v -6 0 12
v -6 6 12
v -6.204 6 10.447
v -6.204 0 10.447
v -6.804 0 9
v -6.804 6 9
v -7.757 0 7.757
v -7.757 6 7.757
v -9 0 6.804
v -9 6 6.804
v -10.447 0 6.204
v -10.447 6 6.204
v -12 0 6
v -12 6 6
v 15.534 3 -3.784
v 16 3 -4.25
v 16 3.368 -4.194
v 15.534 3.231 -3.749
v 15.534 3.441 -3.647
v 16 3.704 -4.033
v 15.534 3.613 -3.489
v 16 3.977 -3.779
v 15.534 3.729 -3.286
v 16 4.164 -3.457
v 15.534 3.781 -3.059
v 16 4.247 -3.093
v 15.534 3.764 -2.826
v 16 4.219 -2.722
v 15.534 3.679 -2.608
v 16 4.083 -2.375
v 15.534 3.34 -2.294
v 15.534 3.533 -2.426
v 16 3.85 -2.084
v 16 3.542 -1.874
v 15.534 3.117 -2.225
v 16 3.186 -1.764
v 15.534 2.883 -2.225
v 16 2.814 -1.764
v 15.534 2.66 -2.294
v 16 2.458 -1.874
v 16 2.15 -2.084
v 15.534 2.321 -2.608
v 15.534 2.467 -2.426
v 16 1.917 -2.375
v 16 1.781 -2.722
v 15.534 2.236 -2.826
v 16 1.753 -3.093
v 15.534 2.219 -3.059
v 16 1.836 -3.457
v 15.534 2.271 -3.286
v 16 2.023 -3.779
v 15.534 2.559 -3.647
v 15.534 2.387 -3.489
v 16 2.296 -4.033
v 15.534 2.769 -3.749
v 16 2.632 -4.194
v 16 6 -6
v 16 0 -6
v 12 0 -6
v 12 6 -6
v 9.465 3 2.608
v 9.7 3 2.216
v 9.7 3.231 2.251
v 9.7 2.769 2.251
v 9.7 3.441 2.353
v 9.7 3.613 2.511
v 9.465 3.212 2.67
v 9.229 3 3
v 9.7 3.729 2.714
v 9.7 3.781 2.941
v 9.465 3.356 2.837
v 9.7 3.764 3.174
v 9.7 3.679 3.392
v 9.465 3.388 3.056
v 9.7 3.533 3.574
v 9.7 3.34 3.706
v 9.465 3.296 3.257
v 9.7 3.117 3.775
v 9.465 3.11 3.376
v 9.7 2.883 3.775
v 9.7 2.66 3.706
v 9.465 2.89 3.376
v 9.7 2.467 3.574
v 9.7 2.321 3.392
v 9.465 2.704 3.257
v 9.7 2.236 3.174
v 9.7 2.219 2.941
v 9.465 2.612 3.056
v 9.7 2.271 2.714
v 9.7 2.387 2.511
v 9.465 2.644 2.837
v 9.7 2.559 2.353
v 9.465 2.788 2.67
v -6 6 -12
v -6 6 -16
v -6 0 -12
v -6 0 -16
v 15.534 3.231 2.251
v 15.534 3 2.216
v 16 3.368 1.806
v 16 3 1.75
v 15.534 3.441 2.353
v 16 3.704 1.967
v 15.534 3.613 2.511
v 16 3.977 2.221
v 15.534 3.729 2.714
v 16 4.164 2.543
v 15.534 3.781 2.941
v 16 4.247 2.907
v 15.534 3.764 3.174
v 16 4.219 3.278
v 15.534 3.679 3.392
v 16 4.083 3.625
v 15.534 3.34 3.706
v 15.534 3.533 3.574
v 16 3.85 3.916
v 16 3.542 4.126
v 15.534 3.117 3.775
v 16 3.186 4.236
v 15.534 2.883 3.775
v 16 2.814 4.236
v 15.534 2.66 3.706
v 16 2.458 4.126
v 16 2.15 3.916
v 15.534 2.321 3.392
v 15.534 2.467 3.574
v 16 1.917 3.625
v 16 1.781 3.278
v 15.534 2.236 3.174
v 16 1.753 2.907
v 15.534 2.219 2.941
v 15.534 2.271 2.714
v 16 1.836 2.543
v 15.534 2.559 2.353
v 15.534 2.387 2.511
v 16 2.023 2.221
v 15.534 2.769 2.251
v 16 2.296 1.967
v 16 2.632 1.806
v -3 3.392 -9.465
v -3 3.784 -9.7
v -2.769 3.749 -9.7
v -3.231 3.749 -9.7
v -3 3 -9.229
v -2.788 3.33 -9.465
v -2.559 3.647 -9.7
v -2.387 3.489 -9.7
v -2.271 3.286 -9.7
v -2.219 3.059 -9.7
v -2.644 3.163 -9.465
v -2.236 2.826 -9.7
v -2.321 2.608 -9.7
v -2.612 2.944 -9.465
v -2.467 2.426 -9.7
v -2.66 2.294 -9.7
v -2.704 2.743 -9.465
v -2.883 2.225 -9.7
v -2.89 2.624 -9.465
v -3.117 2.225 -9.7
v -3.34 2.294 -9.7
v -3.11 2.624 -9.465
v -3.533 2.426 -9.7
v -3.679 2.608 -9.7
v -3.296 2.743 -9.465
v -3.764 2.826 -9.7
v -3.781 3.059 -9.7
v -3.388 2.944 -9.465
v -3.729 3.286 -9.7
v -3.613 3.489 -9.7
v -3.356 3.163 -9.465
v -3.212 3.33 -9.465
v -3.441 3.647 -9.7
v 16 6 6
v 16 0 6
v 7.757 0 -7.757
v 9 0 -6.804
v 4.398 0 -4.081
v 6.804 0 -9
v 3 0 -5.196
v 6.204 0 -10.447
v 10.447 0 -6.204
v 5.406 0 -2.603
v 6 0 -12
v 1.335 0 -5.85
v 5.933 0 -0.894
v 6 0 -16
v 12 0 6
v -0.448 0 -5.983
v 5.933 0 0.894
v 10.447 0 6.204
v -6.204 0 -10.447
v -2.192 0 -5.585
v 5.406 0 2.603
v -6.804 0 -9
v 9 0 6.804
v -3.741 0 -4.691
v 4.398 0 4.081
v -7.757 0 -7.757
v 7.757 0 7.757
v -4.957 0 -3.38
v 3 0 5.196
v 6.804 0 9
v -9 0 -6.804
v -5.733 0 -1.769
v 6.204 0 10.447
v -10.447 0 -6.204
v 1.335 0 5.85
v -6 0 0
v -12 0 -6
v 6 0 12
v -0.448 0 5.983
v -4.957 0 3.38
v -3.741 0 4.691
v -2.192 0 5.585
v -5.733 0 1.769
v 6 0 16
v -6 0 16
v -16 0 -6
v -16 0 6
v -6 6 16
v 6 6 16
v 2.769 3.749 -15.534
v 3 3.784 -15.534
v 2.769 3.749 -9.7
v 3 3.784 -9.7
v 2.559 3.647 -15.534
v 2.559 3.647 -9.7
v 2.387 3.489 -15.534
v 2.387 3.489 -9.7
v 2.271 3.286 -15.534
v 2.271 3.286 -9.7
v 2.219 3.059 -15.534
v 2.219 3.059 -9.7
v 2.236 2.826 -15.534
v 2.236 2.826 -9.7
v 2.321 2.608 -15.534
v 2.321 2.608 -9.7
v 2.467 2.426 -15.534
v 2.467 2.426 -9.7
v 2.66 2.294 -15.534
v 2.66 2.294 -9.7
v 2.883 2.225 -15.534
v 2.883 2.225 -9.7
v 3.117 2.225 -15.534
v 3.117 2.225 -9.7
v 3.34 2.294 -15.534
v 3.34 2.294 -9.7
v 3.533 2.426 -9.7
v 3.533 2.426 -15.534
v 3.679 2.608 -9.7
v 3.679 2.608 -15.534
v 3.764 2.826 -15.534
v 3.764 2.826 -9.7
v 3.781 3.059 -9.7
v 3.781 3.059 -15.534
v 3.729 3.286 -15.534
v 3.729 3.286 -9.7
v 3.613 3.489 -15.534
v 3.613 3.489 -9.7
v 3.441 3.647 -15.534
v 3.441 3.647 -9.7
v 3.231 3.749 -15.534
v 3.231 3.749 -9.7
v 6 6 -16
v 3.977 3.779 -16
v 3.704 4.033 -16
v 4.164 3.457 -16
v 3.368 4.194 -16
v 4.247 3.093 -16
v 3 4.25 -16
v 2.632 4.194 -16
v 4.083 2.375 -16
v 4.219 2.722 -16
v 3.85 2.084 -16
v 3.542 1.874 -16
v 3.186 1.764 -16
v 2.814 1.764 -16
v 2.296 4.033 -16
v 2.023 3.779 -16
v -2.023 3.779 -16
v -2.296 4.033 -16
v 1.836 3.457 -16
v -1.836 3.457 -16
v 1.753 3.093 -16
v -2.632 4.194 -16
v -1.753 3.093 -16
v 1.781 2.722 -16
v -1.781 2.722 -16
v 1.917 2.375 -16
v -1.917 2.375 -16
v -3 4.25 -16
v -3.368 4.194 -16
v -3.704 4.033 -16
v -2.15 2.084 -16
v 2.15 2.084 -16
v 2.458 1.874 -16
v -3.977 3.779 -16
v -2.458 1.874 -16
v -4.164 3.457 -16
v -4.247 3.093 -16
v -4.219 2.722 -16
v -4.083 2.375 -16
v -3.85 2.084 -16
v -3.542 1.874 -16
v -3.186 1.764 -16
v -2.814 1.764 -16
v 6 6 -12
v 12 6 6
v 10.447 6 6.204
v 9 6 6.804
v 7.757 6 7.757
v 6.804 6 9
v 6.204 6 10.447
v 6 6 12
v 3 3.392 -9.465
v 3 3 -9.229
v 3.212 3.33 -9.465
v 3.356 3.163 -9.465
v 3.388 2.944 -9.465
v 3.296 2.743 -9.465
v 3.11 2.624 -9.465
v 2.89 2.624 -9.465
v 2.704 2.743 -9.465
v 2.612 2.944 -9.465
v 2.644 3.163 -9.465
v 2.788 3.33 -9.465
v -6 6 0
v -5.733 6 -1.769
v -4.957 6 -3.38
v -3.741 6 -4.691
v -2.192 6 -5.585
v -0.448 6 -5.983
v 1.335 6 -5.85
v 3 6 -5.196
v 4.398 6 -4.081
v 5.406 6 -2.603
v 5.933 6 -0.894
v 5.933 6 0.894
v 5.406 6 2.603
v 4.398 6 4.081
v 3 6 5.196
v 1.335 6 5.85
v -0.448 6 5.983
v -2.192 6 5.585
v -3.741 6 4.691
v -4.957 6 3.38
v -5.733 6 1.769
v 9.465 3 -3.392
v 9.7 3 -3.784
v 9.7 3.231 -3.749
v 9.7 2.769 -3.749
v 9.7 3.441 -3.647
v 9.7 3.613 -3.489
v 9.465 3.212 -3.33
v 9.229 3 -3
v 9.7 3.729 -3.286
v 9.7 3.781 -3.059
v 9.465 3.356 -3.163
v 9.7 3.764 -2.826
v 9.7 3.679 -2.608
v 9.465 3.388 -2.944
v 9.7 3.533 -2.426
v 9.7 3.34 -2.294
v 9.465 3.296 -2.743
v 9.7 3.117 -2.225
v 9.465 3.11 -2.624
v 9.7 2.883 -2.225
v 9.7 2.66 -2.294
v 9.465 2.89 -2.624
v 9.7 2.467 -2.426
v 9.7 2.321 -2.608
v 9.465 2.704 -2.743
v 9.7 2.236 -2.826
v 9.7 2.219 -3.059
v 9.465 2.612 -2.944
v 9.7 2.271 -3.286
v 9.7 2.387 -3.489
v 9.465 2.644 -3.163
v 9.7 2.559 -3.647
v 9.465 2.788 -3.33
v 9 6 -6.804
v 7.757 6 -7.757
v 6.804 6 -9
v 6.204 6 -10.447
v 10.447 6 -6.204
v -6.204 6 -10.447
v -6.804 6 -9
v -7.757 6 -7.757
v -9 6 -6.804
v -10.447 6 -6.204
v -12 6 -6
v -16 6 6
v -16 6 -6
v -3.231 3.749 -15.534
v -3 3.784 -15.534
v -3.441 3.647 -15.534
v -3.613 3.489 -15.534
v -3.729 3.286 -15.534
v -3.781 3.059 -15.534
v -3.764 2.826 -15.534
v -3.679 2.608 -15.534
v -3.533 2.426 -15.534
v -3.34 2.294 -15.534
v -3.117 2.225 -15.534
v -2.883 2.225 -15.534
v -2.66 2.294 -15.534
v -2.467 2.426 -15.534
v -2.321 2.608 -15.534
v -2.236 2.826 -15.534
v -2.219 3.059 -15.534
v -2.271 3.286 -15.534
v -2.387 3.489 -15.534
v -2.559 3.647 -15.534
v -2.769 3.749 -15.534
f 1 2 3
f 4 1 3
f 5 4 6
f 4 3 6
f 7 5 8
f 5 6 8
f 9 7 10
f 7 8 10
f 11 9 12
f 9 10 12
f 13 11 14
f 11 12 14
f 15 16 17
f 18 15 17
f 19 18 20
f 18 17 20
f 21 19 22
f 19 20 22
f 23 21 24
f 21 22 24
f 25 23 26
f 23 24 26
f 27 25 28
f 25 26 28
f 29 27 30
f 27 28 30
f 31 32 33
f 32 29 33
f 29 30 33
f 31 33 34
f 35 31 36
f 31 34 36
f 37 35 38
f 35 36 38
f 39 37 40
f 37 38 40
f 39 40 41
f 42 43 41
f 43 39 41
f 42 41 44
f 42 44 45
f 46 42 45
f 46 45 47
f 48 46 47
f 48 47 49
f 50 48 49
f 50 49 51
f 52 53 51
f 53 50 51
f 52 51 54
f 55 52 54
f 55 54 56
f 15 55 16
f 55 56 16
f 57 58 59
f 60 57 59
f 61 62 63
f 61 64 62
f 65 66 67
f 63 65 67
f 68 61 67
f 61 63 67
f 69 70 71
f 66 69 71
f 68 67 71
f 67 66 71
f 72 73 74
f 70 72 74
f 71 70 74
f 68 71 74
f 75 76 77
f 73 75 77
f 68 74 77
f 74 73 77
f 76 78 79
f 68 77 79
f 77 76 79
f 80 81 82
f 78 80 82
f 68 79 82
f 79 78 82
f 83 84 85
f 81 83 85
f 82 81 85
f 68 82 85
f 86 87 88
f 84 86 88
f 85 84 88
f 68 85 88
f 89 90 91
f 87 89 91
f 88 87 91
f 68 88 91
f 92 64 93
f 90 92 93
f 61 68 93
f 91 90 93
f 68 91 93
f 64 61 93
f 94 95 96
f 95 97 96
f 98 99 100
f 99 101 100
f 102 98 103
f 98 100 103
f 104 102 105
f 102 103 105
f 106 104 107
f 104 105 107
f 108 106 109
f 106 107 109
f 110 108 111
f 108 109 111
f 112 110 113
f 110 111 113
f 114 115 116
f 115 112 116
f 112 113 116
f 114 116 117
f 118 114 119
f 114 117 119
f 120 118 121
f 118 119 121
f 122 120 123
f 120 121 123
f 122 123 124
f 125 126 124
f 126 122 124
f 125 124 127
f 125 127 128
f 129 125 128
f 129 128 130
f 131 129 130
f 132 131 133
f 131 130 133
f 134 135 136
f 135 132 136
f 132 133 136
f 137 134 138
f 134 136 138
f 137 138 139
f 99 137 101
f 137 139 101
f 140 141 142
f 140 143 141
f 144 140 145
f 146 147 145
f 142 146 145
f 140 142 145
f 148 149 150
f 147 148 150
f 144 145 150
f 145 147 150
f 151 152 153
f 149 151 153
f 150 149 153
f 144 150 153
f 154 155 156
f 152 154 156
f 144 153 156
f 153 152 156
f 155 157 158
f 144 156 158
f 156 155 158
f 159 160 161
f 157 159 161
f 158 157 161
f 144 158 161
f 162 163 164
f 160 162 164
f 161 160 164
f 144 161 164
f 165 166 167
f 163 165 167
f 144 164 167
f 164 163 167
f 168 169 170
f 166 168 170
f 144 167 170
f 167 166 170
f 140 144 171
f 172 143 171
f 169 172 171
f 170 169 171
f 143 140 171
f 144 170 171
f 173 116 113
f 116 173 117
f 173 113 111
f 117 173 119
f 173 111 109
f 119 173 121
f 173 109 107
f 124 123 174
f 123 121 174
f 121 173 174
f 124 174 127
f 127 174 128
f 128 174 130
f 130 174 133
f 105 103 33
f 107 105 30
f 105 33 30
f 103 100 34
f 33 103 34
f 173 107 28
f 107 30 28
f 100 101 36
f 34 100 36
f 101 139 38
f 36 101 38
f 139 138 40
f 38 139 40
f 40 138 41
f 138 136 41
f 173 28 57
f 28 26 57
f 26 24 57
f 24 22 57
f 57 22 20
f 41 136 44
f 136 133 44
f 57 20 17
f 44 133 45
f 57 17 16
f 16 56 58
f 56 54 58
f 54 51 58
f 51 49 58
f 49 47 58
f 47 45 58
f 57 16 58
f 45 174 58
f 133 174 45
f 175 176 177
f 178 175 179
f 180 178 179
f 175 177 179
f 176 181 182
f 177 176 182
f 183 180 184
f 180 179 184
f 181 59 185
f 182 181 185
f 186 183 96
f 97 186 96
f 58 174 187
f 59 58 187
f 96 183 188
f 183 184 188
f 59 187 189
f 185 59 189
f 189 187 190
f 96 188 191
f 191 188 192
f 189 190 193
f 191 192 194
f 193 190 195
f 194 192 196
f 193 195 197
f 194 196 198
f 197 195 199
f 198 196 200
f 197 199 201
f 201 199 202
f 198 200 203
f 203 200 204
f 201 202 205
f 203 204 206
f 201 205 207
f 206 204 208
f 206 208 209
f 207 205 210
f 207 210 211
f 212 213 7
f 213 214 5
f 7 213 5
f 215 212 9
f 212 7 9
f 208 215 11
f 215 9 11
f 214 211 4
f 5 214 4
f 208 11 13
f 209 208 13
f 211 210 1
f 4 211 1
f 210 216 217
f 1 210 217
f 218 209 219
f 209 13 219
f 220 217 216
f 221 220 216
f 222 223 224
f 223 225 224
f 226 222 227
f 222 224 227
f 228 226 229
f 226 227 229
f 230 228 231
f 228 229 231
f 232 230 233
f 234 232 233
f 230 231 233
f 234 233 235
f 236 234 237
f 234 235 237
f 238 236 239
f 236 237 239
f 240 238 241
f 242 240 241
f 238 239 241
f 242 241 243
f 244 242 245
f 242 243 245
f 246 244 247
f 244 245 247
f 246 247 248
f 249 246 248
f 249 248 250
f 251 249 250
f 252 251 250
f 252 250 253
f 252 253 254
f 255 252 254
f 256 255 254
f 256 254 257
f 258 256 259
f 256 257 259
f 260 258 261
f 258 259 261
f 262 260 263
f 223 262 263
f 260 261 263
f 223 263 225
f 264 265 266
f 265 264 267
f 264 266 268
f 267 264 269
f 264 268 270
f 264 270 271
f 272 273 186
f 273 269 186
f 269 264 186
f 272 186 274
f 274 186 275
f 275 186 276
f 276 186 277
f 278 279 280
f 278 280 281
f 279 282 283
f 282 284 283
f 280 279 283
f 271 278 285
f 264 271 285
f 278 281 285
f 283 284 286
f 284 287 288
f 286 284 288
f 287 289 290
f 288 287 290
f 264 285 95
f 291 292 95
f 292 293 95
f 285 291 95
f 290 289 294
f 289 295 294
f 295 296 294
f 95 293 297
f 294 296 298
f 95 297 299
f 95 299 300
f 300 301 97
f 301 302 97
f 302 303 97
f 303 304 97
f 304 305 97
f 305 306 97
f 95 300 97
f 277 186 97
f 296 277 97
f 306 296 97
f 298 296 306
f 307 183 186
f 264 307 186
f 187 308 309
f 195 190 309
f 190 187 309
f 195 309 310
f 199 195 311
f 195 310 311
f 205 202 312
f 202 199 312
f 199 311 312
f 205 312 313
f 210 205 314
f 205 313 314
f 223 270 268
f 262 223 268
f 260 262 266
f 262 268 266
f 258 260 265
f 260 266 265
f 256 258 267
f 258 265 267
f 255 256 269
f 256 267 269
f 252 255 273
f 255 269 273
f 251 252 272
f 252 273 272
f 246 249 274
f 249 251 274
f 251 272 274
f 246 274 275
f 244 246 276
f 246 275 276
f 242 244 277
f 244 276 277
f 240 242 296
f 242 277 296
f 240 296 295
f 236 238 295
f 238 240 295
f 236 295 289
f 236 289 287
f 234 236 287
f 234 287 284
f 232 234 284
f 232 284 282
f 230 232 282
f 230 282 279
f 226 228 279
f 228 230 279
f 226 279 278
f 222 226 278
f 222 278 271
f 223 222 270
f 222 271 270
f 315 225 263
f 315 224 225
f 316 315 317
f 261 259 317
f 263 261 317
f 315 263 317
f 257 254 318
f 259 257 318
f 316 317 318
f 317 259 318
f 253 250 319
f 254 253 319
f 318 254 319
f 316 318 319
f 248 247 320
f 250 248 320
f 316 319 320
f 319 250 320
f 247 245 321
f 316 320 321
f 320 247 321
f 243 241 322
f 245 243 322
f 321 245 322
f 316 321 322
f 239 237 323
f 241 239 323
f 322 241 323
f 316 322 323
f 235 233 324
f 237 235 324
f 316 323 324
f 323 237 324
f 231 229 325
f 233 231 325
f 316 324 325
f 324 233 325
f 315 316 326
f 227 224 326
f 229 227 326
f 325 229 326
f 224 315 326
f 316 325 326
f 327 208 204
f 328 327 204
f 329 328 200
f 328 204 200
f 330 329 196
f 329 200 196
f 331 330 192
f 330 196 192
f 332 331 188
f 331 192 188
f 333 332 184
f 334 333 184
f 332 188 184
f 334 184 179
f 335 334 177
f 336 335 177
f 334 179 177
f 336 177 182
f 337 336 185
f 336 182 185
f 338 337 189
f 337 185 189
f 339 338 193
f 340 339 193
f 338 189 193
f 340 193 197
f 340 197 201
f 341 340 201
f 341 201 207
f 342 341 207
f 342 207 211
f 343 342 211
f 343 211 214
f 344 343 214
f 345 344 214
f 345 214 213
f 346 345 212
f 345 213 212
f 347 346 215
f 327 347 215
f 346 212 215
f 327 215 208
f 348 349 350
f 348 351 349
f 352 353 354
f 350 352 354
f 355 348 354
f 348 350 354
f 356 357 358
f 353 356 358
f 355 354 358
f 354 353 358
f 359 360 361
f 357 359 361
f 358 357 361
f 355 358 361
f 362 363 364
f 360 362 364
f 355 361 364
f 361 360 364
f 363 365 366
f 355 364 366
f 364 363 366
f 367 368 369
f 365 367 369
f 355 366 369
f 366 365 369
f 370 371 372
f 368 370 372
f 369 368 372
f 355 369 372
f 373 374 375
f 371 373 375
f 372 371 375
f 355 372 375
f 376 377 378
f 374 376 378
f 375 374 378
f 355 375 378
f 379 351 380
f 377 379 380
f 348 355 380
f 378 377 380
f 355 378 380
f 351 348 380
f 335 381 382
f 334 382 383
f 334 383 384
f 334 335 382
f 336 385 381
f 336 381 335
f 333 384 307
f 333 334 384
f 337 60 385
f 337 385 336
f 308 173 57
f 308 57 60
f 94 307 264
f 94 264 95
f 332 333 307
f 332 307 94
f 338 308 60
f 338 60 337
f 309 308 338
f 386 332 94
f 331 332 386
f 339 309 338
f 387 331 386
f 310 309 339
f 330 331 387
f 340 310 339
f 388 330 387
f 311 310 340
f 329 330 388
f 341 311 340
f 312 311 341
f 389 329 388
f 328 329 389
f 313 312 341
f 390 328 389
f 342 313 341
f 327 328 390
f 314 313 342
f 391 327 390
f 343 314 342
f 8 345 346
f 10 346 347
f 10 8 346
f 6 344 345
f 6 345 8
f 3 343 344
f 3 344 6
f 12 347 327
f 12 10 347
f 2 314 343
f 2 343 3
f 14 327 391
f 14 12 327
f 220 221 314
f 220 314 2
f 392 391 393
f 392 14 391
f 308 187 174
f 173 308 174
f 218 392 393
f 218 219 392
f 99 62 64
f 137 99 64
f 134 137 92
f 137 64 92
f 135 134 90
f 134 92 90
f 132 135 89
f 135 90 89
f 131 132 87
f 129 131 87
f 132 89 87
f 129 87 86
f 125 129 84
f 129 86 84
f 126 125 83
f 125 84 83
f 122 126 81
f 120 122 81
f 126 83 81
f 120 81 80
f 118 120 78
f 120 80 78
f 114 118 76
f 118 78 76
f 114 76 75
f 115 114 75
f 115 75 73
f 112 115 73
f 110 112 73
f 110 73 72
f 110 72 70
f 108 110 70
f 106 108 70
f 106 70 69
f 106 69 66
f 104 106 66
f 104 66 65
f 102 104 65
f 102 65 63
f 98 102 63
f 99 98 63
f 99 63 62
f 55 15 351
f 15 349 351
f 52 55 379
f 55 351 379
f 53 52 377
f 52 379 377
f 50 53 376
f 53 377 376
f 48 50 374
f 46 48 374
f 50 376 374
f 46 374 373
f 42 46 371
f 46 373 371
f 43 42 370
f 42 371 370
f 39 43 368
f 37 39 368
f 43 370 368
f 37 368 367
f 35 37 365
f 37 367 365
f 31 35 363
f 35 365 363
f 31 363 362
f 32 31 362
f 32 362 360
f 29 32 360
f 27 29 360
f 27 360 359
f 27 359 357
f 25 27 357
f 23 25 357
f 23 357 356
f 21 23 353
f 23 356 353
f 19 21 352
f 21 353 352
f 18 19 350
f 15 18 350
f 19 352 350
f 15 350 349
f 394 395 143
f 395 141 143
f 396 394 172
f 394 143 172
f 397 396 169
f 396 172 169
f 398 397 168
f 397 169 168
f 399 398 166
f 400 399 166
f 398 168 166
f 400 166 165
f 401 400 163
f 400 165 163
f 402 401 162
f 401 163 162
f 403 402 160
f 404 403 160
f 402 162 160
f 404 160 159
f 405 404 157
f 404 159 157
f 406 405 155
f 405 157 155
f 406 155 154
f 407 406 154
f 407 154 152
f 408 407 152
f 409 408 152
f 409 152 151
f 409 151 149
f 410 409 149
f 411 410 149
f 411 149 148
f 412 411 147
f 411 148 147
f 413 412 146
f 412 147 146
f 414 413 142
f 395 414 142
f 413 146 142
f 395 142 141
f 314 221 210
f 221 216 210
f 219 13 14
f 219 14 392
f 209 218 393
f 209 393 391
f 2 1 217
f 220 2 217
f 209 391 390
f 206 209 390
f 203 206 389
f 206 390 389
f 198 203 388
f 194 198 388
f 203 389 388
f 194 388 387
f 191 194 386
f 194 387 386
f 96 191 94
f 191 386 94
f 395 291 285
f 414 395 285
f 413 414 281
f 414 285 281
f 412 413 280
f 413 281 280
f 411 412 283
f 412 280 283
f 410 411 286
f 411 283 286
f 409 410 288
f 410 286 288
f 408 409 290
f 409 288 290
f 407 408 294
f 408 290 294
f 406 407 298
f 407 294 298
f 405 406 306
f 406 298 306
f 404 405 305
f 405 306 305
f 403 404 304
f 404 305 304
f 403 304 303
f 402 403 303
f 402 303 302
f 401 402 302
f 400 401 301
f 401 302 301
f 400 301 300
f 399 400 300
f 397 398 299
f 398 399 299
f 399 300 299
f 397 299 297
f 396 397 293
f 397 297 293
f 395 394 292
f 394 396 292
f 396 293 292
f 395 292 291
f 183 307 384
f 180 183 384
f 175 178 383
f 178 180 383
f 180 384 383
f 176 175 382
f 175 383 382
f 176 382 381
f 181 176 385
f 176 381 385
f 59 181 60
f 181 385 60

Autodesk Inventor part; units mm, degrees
ref_plane "YZ Plane" through (0, 0, 0) normal (1, 0, 0) x (0, 1, 0)
ref_plane "XZ Plane" through (0, 0, 0) normal (0, 1, 0) x (-1, 0, 0)
ref_plane "XY Plane" through (0, 0, 0) normal (0, 0, 1) x (1, 0, 0)
sketch "Sketch1" plane through (0, 0, 0) normal (0, 1, 0) x (-1, 0, 0)
  line L0 (-6, 6) -> (6, 6)
  line L1 (6, 6) -> (6, -6)
  line L2 (6, -6) -> (-6, -6)
  line L3 (-6, -6) -> (-6, 6)
  line L4 (-6, 6) -> (6, -6) construction
  line L5 (6, 6) -> (-6, -6) construction
  line L6 (6, 6) -> (16, 6)
  line L7 (16, -6) -> (6, -6)
  line L8 (6, -6) -> (6, 6)
  line L9 (0, 6) -> (0, -6) construction
  line L10 (-6, 6) -> (-16, 6)
  line L11 (-16, 6) -> (-16, -6)
  line L12 (-16, -6) -> (-6, -6)
  line L13 (-6, -6) -> (-6, -16)
  line L14 (-6, -16) -> (6, -16)
  line L15 (6, -16) -> (6, -6)
  line L16 (6, 6) -> (6, 16)
  line L17 (6, 16) -> (-6, 16)
  line L18 (-6, 16) -> (-6, 6)
  line L19 (16, 6) -> (16, -6)
  line L20 (6, 6) -> (-6, -6) construction
  line L21 (-6, 6) -> (6, -6) construction
  line L22 (-6, -6) -> (6, 6) construction
  circle A0 centre (0, 0) radius 6
  dimension "d0" = 12
  dimension "d1" = 12
  dimension "d6" = 12
  dimension "d38" = 12
  dimension "d39" = 10
  dimension "d40" = 10
extrude "Extrusion9" add sketch "Sketch1" along normal blind 6 contours L18 L17 L16 L0 | L0 A0 L3 | L3 L12 L11 L10 | L0 L1 A0 | A0 L2 L3 | L6 L19 L7 L1 | L1 L2 A0 | L2 L15 L14 L13
fillet "Fillet4" radius 6 4 edges at (-6, 3, -6) (6, 3, -6) (-6, 3, 6) (6, 3, 6)
sketch "Sketch11" plane through (16, 0, 6) normal (1, 0, 0) x (0, 0, -1)
  line L0 (6, 0) -> (6, 6)
  line L1 (0, 6) -> (12, 6) projected
  circle A0 centre (9, 3) radius 1
  line L2 (12, 0) -> (12, 6) projected
  line L3 (0, 0) -> (12, 0) projected
  circle A1 centre (3, 3) radius 1
  dimension "d69" = 2
  dimension "d70" = 3
  dimension "d71" = 3
hole "Hole1" at (16, 3, 3) at (16, 3, -3) direction (-1, 0, 0) diameter 1.567 depth 6.3 tip angle 118 countersink diameter 2.5 countersink angle 90 thread size "M2x0.4" class "6H" standard "ISO Metric profile"
sketch "Sketch14" plane through (6, 0, -16) normal (0, 0, -1) x (-1, 0, 0)
  line L0 (6, 0) -> (6, 6)
  line L1 (0, 6) -> (12, 6) projected
  circle A0 centre (9, 3) radius 1
  line L2 (12, 0) -> (12, 6) projected
  line L3 (0, 0) -> (12, 0) projected
  circle A1 centre (3, 3) radius 1
  dimension "d99" = 2
  dimension "d100" = 3
  dimension "d101" = 3
hole "Hole2" at (3, 3, -16) at (-3, 3, -16) direction (0, 0, 1) diameter 1.567 depth 6.3 tip angle 118 countersink diameter 2.5 countersink angle 90 thread size "M2x0.4" class "6H" standard "ISO Metric profile"
properties part number "rapoukMiddleLeg0v3" material "EN AW-6060 T6"
